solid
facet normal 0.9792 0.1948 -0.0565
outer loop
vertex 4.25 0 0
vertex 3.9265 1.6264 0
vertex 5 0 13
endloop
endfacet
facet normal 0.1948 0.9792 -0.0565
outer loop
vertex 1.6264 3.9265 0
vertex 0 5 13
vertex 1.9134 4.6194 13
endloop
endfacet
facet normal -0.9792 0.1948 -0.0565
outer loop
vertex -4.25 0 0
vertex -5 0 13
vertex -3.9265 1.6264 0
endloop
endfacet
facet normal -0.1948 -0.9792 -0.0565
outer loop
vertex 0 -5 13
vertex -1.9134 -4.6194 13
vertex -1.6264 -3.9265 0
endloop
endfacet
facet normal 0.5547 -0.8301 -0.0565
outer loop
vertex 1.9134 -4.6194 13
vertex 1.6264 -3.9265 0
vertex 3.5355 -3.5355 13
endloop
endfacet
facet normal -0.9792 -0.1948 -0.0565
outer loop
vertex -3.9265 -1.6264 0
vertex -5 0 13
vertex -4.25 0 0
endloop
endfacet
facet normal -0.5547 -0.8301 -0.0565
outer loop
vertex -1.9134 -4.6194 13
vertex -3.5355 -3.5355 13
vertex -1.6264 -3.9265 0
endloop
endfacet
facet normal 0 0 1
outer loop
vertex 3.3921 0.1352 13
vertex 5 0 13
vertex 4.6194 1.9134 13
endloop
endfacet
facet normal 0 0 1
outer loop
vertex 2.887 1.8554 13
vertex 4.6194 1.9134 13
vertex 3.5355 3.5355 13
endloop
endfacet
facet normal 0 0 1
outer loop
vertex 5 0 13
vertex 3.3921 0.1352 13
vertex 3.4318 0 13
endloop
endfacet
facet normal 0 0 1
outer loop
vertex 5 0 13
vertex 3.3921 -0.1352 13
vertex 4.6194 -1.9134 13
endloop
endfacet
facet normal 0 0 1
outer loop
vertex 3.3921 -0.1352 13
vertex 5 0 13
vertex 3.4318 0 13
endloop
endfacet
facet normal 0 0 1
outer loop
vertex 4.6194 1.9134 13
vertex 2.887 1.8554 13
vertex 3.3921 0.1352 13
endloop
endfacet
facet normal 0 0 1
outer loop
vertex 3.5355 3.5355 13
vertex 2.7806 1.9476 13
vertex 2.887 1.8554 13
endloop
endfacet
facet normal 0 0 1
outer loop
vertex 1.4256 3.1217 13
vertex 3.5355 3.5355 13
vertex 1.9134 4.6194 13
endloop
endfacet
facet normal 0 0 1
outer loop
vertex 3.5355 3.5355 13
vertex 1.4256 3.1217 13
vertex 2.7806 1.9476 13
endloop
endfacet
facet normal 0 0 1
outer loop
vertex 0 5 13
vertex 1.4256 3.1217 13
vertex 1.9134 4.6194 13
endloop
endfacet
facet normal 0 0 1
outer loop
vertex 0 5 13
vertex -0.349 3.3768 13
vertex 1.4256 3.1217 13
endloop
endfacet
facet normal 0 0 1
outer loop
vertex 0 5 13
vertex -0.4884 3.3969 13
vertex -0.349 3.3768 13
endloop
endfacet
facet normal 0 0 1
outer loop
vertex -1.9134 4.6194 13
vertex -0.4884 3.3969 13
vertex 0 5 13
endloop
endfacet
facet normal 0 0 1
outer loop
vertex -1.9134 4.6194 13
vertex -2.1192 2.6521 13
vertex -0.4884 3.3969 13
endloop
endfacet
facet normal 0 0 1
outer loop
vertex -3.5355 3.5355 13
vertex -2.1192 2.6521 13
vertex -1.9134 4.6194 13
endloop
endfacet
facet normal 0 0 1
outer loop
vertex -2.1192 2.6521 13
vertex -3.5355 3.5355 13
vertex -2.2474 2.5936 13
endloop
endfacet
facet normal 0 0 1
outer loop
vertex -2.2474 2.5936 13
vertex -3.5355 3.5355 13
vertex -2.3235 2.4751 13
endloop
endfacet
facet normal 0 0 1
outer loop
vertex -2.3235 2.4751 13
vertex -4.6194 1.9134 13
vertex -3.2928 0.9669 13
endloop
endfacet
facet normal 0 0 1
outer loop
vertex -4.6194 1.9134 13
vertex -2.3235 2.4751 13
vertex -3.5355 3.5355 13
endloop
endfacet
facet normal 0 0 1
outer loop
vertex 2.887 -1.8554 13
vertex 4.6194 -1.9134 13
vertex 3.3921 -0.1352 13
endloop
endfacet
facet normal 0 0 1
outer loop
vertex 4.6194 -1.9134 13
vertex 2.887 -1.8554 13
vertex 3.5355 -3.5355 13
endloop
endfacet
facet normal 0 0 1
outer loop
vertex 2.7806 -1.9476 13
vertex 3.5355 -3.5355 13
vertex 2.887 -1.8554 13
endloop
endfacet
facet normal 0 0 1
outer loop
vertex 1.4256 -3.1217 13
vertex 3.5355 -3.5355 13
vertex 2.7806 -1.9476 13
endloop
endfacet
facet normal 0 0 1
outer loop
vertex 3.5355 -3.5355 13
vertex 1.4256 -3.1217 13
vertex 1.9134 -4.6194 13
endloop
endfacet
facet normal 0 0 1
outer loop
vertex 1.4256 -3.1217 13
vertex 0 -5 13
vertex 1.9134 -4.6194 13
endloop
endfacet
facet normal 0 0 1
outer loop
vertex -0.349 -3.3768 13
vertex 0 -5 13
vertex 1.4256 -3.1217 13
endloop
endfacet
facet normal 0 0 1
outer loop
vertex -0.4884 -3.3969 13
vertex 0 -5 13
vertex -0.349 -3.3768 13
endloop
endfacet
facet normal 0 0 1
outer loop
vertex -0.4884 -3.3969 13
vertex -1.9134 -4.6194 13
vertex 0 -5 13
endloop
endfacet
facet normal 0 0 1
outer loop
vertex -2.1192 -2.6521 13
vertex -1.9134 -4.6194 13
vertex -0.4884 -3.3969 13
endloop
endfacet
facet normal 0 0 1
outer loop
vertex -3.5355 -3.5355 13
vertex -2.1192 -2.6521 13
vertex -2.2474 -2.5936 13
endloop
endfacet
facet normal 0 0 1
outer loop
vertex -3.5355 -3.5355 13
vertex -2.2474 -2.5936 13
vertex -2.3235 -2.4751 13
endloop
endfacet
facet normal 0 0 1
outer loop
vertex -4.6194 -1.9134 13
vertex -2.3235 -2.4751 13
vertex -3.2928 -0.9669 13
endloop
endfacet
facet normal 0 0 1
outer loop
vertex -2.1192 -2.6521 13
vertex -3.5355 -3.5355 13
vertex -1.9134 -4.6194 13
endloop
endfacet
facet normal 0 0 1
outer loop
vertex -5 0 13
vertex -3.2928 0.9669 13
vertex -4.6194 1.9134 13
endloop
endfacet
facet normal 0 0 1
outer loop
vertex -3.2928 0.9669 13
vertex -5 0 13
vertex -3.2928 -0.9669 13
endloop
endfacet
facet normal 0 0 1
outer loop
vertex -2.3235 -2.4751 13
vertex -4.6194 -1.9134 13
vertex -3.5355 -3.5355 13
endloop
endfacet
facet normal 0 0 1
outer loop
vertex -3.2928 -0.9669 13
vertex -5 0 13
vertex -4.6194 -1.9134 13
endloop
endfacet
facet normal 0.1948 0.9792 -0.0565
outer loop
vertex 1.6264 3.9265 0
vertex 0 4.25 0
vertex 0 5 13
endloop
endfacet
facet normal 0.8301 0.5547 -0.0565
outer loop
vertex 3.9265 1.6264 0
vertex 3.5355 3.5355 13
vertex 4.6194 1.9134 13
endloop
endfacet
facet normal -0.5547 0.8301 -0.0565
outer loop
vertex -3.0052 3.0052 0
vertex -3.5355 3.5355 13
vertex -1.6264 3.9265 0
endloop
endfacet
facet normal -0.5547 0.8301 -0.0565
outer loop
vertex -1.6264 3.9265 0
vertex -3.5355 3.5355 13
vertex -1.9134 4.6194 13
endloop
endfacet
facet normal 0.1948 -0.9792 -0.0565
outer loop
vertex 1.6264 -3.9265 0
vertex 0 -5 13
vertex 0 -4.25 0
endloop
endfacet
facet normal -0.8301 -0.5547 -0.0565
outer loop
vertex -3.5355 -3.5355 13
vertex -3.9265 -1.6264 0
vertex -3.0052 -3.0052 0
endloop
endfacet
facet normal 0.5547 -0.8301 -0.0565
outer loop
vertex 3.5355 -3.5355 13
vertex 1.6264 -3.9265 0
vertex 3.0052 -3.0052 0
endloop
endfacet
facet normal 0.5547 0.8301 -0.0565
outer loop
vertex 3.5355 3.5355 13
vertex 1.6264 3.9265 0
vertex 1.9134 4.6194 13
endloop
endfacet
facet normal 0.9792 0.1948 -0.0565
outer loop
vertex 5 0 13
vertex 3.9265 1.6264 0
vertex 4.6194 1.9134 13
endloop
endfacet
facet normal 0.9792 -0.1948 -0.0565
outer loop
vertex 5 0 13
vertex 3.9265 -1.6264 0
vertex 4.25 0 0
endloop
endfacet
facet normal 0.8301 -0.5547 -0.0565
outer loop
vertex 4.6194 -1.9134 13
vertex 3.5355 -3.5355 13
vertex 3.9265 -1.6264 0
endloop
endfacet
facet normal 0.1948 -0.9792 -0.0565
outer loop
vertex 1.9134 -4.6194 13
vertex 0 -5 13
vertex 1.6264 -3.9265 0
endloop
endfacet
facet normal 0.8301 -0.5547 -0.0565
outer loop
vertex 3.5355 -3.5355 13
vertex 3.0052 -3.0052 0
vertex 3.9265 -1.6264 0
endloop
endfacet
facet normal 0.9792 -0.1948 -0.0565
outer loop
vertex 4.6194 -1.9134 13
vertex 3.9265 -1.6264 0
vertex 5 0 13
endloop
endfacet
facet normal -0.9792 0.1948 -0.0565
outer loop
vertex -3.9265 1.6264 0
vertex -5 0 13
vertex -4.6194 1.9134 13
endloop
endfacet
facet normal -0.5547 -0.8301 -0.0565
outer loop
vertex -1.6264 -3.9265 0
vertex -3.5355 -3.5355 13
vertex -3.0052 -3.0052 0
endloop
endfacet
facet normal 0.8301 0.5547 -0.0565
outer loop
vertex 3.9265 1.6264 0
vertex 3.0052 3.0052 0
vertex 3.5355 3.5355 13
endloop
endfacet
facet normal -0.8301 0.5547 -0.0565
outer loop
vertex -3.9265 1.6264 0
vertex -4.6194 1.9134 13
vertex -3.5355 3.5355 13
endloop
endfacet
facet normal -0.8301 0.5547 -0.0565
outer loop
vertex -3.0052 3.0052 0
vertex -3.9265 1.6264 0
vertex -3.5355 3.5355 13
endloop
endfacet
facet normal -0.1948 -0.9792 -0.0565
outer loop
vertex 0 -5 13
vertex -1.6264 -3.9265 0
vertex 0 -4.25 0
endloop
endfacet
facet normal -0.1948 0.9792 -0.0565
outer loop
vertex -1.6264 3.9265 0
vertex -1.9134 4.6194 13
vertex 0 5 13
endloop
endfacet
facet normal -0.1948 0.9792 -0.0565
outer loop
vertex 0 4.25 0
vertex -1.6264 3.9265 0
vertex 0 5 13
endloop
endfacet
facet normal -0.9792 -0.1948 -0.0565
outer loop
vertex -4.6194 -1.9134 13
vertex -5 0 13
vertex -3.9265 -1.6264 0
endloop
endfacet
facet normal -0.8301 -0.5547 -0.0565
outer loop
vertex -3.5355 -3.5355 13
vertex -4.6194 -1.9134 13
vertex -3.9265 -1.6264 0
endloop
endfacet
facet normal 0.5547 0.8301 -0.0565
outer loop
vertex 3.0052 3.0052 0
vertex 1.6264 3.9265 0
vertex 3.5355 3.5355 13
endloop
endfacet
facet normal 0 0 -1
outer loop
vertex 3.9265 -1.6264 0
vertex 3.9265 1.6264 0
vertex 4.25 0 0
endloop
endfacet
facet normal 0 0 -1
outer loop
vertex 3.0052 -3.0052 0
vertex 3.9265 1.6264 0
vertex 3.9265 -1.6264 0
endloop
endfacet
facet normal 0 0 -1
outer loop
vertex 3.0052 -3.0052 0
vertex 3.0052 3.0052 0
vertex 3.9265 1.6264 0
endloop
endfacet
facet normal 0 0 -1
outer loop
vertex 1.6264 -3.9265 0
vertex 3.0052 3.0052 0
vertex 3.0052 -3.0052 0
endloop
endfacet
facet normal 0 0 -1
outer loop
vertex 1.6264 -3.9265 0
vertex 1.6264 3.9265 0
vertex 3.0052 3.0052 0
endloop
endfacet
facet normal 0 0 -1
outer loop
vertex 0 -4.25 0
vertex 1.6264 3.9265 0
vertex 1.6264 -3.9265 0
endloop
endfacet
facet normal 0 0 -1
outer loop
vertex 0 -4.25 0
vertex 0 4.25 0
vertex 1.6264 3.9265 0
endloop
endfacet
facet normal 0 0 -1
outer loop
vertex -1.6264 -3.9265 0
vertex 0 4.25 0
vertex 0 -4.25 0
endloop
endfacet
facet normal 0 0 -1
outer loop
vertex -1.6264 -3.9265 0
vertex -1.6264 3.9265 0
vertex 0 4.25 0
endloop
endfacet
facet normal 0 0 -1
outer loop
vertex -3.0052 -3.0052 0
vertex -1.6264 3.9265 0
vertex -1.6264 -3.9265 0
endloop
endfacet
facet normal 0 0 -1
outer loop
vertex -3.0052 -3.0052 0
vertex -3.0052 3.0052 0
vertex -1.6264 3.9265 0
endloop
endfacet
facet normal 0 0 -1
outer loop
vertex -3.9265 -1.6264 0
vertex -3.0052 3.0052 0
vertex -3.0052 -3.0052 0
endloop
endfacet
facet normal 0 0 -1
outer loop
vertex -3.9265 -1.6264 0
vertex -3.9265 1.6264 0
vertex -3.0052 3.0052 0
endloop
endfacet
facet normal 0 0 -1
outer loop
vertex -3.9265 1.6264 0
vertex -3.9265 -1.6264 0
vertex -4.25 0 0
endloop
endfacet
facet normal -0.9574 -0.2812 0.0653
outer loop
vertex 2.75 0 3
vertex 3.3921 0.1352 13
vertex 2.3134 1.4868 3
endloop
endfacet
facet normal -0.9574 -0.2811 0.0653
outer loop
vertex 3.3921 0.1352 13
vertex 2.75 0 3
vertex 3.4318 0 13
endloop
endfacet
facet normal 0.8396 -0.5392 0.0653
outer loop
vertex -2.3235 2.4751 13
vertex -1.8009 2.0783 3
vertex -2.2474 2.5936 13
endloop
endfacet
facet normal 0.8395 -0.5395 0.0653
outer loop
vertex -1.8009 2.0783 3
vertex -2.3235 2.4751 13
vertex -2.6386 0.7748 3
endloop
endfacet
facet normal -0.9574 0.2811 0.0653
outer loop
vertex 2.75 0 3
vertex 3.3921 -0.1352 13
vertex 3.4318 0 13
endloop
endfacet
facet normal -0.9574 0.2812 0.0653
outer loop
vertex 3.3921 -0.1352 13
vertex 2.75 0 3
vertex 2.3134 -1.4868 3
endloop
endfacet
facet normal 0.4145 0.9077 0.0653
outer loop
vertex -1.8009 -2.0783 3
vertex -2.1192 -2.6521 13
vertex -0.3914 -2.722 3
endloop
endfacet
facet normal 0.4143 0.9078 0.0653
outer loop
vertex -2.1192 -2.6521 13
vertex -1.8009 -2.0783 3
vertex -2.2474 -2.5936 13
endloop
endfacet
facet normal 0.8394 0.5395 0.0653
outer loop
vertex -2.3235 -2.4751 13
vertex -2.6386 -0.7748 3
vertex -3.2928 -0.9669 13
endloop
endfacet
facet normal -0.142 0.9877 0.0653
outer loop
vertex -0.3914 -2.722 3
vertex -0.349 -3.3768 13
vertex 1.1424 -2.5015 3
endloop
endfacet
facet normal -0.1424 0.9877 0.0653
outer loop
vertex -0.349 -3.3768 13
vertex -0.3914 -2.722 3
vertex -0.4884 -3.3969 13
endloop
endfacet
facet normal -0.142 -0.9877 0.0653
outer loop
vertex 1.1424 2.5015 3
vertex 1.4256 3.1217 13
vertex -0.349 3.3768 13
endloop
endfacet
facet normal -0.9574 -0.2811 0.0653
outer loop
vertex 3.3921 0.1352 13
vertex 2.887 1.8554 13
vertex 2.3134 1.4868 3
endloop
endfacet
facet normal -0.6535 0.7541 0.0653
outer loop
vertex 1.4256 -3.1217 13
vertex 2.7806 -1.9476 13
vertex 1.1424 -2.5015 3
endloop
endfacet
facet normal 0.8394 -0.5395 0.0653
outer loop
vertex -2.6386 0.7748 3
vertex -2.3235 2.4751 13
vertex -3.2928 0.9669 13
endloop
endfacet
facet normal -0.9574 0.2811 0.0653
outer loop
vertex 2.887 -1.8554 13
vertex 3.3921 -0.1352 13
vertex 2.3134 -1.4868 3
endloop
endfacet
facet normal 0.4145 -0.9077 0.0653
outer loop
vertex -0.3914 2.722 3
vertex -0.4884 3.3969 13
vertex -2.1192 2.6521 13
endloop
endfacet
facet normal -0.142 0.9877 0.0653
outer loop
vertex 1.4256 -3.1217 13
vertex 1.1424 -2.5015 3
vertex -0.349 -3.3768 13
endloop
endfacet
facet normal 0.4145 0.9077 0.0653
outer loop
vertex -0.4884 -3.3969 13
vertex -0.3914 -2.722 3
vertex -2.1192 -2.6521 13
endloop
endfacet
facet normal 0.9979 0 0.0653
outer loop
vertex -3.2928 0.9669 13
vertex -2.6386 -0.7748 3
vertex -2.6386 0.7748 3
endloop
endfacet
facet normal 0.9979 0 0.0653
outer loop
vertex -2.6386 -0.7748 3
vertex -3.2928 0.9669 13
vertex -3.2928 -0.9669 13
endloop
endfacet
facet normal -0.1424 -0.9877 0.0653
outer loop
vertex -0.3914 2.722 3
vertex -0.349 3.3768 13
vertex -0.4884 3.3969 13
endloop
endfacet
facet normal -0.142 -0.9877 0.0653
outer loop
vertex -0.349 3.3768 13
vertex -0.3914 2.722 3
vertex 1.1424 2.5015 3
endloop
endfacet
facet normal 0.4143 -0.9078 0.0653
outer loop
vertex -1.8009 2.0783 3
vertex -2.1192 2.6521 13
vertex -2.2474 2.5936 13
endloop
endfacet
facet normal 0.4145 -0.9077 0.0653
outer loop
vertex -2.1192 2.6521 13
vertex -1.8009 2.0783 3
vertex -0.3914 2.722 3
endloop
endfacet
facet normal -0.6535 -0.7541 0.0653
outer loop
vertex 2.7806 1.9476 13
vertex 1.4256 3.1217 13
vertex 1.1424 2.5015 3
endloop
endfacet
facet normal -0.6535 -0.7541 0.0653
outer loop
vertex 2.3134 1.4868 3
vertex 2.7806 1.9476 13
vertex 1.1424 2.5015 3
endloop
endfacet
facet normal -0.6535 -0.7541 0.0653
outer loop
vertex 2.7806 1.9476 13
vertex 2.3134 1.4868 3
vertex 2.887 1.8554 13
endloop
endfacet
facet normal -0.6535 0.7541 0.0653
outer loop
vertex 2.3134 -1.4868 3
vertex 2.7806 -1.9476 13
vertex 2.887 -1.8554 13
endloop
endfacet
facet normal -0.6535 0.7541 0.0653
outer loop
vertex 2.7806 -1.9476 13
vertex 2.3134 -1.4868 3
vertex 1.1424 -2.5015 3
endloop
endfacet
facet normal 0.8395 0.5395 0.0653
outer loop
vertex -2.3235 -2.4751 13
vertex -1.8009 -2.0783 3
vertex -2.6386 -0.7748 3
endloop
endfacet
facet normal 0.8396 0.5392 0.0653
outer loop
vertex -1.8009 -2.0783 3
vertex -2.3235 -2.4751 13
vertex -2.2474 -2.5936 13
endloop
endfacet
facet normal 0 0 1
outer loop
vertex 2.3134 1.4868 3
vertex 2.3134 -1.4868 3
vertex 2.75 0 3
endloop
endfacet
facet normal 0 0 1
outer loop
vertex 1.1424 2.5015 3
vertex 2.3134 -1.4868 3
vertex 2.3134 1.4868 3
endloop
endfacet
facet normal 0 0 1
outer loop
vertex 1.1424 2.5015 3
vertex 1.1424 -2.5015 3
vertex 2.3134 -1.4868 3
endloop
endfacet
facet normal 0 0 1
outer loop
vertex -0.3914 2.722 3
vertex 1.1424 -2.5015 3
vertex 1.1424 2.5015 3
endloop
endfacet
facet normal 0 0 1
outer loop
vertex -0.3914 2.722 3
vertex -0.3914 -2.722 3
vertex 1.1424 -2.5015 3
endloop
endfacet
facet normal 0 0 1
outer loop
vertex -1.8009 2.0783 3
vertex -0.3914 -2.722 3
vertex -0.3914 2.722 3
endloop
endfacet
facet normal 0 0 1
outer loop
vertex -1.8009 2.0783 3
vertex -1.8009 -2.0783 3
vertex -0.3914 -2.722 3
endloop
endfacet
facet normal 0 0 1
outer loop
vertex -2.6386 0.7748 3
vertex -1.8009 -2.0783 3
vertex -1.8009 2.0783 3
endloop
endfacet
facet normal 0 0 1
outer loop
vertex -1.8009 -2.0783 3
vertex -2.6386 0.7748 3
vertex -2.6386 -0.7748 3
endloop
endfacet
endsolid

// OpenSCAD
// file: cap.scad
/*
    Simple cap.
    
    Print Notes
        Use a rubbery plastic. The type I have sometimes is dodgy on the first layer.
        Using  brim may help.
*/

module cap( d1, d2, h, thickness )
{
    difference() {
        cylinder( d1=d1+thickness, d2=d2 + thickness, h=h+thickness );
        translate( [0,0,thickness] ) {
            cylinder( d1=d1, d2=d2, h=h+1 );
        }
    }
}
// main file
/*
    A cap for a shot pourer (the things you put on a spirit bottle to make pouring shots easier.
    Search for "Stainless Steel Shot Pourer, on ebay etc.
    This is for the stainless steel type, which have a tapered spout, and a metal air inlet pipe.

    There are similar looking ones with a black rubber air inlet with a straight (non-tapered)
    spout. Don't buy those ones, they are crap, but if you have them, use : cap-ShotPourer-Cheap.scad
    
    Print Notes
        Print using a rubbery plastic.
*/

use <cap.scad>;

cap( 5.5, 7,  10,  3 );
